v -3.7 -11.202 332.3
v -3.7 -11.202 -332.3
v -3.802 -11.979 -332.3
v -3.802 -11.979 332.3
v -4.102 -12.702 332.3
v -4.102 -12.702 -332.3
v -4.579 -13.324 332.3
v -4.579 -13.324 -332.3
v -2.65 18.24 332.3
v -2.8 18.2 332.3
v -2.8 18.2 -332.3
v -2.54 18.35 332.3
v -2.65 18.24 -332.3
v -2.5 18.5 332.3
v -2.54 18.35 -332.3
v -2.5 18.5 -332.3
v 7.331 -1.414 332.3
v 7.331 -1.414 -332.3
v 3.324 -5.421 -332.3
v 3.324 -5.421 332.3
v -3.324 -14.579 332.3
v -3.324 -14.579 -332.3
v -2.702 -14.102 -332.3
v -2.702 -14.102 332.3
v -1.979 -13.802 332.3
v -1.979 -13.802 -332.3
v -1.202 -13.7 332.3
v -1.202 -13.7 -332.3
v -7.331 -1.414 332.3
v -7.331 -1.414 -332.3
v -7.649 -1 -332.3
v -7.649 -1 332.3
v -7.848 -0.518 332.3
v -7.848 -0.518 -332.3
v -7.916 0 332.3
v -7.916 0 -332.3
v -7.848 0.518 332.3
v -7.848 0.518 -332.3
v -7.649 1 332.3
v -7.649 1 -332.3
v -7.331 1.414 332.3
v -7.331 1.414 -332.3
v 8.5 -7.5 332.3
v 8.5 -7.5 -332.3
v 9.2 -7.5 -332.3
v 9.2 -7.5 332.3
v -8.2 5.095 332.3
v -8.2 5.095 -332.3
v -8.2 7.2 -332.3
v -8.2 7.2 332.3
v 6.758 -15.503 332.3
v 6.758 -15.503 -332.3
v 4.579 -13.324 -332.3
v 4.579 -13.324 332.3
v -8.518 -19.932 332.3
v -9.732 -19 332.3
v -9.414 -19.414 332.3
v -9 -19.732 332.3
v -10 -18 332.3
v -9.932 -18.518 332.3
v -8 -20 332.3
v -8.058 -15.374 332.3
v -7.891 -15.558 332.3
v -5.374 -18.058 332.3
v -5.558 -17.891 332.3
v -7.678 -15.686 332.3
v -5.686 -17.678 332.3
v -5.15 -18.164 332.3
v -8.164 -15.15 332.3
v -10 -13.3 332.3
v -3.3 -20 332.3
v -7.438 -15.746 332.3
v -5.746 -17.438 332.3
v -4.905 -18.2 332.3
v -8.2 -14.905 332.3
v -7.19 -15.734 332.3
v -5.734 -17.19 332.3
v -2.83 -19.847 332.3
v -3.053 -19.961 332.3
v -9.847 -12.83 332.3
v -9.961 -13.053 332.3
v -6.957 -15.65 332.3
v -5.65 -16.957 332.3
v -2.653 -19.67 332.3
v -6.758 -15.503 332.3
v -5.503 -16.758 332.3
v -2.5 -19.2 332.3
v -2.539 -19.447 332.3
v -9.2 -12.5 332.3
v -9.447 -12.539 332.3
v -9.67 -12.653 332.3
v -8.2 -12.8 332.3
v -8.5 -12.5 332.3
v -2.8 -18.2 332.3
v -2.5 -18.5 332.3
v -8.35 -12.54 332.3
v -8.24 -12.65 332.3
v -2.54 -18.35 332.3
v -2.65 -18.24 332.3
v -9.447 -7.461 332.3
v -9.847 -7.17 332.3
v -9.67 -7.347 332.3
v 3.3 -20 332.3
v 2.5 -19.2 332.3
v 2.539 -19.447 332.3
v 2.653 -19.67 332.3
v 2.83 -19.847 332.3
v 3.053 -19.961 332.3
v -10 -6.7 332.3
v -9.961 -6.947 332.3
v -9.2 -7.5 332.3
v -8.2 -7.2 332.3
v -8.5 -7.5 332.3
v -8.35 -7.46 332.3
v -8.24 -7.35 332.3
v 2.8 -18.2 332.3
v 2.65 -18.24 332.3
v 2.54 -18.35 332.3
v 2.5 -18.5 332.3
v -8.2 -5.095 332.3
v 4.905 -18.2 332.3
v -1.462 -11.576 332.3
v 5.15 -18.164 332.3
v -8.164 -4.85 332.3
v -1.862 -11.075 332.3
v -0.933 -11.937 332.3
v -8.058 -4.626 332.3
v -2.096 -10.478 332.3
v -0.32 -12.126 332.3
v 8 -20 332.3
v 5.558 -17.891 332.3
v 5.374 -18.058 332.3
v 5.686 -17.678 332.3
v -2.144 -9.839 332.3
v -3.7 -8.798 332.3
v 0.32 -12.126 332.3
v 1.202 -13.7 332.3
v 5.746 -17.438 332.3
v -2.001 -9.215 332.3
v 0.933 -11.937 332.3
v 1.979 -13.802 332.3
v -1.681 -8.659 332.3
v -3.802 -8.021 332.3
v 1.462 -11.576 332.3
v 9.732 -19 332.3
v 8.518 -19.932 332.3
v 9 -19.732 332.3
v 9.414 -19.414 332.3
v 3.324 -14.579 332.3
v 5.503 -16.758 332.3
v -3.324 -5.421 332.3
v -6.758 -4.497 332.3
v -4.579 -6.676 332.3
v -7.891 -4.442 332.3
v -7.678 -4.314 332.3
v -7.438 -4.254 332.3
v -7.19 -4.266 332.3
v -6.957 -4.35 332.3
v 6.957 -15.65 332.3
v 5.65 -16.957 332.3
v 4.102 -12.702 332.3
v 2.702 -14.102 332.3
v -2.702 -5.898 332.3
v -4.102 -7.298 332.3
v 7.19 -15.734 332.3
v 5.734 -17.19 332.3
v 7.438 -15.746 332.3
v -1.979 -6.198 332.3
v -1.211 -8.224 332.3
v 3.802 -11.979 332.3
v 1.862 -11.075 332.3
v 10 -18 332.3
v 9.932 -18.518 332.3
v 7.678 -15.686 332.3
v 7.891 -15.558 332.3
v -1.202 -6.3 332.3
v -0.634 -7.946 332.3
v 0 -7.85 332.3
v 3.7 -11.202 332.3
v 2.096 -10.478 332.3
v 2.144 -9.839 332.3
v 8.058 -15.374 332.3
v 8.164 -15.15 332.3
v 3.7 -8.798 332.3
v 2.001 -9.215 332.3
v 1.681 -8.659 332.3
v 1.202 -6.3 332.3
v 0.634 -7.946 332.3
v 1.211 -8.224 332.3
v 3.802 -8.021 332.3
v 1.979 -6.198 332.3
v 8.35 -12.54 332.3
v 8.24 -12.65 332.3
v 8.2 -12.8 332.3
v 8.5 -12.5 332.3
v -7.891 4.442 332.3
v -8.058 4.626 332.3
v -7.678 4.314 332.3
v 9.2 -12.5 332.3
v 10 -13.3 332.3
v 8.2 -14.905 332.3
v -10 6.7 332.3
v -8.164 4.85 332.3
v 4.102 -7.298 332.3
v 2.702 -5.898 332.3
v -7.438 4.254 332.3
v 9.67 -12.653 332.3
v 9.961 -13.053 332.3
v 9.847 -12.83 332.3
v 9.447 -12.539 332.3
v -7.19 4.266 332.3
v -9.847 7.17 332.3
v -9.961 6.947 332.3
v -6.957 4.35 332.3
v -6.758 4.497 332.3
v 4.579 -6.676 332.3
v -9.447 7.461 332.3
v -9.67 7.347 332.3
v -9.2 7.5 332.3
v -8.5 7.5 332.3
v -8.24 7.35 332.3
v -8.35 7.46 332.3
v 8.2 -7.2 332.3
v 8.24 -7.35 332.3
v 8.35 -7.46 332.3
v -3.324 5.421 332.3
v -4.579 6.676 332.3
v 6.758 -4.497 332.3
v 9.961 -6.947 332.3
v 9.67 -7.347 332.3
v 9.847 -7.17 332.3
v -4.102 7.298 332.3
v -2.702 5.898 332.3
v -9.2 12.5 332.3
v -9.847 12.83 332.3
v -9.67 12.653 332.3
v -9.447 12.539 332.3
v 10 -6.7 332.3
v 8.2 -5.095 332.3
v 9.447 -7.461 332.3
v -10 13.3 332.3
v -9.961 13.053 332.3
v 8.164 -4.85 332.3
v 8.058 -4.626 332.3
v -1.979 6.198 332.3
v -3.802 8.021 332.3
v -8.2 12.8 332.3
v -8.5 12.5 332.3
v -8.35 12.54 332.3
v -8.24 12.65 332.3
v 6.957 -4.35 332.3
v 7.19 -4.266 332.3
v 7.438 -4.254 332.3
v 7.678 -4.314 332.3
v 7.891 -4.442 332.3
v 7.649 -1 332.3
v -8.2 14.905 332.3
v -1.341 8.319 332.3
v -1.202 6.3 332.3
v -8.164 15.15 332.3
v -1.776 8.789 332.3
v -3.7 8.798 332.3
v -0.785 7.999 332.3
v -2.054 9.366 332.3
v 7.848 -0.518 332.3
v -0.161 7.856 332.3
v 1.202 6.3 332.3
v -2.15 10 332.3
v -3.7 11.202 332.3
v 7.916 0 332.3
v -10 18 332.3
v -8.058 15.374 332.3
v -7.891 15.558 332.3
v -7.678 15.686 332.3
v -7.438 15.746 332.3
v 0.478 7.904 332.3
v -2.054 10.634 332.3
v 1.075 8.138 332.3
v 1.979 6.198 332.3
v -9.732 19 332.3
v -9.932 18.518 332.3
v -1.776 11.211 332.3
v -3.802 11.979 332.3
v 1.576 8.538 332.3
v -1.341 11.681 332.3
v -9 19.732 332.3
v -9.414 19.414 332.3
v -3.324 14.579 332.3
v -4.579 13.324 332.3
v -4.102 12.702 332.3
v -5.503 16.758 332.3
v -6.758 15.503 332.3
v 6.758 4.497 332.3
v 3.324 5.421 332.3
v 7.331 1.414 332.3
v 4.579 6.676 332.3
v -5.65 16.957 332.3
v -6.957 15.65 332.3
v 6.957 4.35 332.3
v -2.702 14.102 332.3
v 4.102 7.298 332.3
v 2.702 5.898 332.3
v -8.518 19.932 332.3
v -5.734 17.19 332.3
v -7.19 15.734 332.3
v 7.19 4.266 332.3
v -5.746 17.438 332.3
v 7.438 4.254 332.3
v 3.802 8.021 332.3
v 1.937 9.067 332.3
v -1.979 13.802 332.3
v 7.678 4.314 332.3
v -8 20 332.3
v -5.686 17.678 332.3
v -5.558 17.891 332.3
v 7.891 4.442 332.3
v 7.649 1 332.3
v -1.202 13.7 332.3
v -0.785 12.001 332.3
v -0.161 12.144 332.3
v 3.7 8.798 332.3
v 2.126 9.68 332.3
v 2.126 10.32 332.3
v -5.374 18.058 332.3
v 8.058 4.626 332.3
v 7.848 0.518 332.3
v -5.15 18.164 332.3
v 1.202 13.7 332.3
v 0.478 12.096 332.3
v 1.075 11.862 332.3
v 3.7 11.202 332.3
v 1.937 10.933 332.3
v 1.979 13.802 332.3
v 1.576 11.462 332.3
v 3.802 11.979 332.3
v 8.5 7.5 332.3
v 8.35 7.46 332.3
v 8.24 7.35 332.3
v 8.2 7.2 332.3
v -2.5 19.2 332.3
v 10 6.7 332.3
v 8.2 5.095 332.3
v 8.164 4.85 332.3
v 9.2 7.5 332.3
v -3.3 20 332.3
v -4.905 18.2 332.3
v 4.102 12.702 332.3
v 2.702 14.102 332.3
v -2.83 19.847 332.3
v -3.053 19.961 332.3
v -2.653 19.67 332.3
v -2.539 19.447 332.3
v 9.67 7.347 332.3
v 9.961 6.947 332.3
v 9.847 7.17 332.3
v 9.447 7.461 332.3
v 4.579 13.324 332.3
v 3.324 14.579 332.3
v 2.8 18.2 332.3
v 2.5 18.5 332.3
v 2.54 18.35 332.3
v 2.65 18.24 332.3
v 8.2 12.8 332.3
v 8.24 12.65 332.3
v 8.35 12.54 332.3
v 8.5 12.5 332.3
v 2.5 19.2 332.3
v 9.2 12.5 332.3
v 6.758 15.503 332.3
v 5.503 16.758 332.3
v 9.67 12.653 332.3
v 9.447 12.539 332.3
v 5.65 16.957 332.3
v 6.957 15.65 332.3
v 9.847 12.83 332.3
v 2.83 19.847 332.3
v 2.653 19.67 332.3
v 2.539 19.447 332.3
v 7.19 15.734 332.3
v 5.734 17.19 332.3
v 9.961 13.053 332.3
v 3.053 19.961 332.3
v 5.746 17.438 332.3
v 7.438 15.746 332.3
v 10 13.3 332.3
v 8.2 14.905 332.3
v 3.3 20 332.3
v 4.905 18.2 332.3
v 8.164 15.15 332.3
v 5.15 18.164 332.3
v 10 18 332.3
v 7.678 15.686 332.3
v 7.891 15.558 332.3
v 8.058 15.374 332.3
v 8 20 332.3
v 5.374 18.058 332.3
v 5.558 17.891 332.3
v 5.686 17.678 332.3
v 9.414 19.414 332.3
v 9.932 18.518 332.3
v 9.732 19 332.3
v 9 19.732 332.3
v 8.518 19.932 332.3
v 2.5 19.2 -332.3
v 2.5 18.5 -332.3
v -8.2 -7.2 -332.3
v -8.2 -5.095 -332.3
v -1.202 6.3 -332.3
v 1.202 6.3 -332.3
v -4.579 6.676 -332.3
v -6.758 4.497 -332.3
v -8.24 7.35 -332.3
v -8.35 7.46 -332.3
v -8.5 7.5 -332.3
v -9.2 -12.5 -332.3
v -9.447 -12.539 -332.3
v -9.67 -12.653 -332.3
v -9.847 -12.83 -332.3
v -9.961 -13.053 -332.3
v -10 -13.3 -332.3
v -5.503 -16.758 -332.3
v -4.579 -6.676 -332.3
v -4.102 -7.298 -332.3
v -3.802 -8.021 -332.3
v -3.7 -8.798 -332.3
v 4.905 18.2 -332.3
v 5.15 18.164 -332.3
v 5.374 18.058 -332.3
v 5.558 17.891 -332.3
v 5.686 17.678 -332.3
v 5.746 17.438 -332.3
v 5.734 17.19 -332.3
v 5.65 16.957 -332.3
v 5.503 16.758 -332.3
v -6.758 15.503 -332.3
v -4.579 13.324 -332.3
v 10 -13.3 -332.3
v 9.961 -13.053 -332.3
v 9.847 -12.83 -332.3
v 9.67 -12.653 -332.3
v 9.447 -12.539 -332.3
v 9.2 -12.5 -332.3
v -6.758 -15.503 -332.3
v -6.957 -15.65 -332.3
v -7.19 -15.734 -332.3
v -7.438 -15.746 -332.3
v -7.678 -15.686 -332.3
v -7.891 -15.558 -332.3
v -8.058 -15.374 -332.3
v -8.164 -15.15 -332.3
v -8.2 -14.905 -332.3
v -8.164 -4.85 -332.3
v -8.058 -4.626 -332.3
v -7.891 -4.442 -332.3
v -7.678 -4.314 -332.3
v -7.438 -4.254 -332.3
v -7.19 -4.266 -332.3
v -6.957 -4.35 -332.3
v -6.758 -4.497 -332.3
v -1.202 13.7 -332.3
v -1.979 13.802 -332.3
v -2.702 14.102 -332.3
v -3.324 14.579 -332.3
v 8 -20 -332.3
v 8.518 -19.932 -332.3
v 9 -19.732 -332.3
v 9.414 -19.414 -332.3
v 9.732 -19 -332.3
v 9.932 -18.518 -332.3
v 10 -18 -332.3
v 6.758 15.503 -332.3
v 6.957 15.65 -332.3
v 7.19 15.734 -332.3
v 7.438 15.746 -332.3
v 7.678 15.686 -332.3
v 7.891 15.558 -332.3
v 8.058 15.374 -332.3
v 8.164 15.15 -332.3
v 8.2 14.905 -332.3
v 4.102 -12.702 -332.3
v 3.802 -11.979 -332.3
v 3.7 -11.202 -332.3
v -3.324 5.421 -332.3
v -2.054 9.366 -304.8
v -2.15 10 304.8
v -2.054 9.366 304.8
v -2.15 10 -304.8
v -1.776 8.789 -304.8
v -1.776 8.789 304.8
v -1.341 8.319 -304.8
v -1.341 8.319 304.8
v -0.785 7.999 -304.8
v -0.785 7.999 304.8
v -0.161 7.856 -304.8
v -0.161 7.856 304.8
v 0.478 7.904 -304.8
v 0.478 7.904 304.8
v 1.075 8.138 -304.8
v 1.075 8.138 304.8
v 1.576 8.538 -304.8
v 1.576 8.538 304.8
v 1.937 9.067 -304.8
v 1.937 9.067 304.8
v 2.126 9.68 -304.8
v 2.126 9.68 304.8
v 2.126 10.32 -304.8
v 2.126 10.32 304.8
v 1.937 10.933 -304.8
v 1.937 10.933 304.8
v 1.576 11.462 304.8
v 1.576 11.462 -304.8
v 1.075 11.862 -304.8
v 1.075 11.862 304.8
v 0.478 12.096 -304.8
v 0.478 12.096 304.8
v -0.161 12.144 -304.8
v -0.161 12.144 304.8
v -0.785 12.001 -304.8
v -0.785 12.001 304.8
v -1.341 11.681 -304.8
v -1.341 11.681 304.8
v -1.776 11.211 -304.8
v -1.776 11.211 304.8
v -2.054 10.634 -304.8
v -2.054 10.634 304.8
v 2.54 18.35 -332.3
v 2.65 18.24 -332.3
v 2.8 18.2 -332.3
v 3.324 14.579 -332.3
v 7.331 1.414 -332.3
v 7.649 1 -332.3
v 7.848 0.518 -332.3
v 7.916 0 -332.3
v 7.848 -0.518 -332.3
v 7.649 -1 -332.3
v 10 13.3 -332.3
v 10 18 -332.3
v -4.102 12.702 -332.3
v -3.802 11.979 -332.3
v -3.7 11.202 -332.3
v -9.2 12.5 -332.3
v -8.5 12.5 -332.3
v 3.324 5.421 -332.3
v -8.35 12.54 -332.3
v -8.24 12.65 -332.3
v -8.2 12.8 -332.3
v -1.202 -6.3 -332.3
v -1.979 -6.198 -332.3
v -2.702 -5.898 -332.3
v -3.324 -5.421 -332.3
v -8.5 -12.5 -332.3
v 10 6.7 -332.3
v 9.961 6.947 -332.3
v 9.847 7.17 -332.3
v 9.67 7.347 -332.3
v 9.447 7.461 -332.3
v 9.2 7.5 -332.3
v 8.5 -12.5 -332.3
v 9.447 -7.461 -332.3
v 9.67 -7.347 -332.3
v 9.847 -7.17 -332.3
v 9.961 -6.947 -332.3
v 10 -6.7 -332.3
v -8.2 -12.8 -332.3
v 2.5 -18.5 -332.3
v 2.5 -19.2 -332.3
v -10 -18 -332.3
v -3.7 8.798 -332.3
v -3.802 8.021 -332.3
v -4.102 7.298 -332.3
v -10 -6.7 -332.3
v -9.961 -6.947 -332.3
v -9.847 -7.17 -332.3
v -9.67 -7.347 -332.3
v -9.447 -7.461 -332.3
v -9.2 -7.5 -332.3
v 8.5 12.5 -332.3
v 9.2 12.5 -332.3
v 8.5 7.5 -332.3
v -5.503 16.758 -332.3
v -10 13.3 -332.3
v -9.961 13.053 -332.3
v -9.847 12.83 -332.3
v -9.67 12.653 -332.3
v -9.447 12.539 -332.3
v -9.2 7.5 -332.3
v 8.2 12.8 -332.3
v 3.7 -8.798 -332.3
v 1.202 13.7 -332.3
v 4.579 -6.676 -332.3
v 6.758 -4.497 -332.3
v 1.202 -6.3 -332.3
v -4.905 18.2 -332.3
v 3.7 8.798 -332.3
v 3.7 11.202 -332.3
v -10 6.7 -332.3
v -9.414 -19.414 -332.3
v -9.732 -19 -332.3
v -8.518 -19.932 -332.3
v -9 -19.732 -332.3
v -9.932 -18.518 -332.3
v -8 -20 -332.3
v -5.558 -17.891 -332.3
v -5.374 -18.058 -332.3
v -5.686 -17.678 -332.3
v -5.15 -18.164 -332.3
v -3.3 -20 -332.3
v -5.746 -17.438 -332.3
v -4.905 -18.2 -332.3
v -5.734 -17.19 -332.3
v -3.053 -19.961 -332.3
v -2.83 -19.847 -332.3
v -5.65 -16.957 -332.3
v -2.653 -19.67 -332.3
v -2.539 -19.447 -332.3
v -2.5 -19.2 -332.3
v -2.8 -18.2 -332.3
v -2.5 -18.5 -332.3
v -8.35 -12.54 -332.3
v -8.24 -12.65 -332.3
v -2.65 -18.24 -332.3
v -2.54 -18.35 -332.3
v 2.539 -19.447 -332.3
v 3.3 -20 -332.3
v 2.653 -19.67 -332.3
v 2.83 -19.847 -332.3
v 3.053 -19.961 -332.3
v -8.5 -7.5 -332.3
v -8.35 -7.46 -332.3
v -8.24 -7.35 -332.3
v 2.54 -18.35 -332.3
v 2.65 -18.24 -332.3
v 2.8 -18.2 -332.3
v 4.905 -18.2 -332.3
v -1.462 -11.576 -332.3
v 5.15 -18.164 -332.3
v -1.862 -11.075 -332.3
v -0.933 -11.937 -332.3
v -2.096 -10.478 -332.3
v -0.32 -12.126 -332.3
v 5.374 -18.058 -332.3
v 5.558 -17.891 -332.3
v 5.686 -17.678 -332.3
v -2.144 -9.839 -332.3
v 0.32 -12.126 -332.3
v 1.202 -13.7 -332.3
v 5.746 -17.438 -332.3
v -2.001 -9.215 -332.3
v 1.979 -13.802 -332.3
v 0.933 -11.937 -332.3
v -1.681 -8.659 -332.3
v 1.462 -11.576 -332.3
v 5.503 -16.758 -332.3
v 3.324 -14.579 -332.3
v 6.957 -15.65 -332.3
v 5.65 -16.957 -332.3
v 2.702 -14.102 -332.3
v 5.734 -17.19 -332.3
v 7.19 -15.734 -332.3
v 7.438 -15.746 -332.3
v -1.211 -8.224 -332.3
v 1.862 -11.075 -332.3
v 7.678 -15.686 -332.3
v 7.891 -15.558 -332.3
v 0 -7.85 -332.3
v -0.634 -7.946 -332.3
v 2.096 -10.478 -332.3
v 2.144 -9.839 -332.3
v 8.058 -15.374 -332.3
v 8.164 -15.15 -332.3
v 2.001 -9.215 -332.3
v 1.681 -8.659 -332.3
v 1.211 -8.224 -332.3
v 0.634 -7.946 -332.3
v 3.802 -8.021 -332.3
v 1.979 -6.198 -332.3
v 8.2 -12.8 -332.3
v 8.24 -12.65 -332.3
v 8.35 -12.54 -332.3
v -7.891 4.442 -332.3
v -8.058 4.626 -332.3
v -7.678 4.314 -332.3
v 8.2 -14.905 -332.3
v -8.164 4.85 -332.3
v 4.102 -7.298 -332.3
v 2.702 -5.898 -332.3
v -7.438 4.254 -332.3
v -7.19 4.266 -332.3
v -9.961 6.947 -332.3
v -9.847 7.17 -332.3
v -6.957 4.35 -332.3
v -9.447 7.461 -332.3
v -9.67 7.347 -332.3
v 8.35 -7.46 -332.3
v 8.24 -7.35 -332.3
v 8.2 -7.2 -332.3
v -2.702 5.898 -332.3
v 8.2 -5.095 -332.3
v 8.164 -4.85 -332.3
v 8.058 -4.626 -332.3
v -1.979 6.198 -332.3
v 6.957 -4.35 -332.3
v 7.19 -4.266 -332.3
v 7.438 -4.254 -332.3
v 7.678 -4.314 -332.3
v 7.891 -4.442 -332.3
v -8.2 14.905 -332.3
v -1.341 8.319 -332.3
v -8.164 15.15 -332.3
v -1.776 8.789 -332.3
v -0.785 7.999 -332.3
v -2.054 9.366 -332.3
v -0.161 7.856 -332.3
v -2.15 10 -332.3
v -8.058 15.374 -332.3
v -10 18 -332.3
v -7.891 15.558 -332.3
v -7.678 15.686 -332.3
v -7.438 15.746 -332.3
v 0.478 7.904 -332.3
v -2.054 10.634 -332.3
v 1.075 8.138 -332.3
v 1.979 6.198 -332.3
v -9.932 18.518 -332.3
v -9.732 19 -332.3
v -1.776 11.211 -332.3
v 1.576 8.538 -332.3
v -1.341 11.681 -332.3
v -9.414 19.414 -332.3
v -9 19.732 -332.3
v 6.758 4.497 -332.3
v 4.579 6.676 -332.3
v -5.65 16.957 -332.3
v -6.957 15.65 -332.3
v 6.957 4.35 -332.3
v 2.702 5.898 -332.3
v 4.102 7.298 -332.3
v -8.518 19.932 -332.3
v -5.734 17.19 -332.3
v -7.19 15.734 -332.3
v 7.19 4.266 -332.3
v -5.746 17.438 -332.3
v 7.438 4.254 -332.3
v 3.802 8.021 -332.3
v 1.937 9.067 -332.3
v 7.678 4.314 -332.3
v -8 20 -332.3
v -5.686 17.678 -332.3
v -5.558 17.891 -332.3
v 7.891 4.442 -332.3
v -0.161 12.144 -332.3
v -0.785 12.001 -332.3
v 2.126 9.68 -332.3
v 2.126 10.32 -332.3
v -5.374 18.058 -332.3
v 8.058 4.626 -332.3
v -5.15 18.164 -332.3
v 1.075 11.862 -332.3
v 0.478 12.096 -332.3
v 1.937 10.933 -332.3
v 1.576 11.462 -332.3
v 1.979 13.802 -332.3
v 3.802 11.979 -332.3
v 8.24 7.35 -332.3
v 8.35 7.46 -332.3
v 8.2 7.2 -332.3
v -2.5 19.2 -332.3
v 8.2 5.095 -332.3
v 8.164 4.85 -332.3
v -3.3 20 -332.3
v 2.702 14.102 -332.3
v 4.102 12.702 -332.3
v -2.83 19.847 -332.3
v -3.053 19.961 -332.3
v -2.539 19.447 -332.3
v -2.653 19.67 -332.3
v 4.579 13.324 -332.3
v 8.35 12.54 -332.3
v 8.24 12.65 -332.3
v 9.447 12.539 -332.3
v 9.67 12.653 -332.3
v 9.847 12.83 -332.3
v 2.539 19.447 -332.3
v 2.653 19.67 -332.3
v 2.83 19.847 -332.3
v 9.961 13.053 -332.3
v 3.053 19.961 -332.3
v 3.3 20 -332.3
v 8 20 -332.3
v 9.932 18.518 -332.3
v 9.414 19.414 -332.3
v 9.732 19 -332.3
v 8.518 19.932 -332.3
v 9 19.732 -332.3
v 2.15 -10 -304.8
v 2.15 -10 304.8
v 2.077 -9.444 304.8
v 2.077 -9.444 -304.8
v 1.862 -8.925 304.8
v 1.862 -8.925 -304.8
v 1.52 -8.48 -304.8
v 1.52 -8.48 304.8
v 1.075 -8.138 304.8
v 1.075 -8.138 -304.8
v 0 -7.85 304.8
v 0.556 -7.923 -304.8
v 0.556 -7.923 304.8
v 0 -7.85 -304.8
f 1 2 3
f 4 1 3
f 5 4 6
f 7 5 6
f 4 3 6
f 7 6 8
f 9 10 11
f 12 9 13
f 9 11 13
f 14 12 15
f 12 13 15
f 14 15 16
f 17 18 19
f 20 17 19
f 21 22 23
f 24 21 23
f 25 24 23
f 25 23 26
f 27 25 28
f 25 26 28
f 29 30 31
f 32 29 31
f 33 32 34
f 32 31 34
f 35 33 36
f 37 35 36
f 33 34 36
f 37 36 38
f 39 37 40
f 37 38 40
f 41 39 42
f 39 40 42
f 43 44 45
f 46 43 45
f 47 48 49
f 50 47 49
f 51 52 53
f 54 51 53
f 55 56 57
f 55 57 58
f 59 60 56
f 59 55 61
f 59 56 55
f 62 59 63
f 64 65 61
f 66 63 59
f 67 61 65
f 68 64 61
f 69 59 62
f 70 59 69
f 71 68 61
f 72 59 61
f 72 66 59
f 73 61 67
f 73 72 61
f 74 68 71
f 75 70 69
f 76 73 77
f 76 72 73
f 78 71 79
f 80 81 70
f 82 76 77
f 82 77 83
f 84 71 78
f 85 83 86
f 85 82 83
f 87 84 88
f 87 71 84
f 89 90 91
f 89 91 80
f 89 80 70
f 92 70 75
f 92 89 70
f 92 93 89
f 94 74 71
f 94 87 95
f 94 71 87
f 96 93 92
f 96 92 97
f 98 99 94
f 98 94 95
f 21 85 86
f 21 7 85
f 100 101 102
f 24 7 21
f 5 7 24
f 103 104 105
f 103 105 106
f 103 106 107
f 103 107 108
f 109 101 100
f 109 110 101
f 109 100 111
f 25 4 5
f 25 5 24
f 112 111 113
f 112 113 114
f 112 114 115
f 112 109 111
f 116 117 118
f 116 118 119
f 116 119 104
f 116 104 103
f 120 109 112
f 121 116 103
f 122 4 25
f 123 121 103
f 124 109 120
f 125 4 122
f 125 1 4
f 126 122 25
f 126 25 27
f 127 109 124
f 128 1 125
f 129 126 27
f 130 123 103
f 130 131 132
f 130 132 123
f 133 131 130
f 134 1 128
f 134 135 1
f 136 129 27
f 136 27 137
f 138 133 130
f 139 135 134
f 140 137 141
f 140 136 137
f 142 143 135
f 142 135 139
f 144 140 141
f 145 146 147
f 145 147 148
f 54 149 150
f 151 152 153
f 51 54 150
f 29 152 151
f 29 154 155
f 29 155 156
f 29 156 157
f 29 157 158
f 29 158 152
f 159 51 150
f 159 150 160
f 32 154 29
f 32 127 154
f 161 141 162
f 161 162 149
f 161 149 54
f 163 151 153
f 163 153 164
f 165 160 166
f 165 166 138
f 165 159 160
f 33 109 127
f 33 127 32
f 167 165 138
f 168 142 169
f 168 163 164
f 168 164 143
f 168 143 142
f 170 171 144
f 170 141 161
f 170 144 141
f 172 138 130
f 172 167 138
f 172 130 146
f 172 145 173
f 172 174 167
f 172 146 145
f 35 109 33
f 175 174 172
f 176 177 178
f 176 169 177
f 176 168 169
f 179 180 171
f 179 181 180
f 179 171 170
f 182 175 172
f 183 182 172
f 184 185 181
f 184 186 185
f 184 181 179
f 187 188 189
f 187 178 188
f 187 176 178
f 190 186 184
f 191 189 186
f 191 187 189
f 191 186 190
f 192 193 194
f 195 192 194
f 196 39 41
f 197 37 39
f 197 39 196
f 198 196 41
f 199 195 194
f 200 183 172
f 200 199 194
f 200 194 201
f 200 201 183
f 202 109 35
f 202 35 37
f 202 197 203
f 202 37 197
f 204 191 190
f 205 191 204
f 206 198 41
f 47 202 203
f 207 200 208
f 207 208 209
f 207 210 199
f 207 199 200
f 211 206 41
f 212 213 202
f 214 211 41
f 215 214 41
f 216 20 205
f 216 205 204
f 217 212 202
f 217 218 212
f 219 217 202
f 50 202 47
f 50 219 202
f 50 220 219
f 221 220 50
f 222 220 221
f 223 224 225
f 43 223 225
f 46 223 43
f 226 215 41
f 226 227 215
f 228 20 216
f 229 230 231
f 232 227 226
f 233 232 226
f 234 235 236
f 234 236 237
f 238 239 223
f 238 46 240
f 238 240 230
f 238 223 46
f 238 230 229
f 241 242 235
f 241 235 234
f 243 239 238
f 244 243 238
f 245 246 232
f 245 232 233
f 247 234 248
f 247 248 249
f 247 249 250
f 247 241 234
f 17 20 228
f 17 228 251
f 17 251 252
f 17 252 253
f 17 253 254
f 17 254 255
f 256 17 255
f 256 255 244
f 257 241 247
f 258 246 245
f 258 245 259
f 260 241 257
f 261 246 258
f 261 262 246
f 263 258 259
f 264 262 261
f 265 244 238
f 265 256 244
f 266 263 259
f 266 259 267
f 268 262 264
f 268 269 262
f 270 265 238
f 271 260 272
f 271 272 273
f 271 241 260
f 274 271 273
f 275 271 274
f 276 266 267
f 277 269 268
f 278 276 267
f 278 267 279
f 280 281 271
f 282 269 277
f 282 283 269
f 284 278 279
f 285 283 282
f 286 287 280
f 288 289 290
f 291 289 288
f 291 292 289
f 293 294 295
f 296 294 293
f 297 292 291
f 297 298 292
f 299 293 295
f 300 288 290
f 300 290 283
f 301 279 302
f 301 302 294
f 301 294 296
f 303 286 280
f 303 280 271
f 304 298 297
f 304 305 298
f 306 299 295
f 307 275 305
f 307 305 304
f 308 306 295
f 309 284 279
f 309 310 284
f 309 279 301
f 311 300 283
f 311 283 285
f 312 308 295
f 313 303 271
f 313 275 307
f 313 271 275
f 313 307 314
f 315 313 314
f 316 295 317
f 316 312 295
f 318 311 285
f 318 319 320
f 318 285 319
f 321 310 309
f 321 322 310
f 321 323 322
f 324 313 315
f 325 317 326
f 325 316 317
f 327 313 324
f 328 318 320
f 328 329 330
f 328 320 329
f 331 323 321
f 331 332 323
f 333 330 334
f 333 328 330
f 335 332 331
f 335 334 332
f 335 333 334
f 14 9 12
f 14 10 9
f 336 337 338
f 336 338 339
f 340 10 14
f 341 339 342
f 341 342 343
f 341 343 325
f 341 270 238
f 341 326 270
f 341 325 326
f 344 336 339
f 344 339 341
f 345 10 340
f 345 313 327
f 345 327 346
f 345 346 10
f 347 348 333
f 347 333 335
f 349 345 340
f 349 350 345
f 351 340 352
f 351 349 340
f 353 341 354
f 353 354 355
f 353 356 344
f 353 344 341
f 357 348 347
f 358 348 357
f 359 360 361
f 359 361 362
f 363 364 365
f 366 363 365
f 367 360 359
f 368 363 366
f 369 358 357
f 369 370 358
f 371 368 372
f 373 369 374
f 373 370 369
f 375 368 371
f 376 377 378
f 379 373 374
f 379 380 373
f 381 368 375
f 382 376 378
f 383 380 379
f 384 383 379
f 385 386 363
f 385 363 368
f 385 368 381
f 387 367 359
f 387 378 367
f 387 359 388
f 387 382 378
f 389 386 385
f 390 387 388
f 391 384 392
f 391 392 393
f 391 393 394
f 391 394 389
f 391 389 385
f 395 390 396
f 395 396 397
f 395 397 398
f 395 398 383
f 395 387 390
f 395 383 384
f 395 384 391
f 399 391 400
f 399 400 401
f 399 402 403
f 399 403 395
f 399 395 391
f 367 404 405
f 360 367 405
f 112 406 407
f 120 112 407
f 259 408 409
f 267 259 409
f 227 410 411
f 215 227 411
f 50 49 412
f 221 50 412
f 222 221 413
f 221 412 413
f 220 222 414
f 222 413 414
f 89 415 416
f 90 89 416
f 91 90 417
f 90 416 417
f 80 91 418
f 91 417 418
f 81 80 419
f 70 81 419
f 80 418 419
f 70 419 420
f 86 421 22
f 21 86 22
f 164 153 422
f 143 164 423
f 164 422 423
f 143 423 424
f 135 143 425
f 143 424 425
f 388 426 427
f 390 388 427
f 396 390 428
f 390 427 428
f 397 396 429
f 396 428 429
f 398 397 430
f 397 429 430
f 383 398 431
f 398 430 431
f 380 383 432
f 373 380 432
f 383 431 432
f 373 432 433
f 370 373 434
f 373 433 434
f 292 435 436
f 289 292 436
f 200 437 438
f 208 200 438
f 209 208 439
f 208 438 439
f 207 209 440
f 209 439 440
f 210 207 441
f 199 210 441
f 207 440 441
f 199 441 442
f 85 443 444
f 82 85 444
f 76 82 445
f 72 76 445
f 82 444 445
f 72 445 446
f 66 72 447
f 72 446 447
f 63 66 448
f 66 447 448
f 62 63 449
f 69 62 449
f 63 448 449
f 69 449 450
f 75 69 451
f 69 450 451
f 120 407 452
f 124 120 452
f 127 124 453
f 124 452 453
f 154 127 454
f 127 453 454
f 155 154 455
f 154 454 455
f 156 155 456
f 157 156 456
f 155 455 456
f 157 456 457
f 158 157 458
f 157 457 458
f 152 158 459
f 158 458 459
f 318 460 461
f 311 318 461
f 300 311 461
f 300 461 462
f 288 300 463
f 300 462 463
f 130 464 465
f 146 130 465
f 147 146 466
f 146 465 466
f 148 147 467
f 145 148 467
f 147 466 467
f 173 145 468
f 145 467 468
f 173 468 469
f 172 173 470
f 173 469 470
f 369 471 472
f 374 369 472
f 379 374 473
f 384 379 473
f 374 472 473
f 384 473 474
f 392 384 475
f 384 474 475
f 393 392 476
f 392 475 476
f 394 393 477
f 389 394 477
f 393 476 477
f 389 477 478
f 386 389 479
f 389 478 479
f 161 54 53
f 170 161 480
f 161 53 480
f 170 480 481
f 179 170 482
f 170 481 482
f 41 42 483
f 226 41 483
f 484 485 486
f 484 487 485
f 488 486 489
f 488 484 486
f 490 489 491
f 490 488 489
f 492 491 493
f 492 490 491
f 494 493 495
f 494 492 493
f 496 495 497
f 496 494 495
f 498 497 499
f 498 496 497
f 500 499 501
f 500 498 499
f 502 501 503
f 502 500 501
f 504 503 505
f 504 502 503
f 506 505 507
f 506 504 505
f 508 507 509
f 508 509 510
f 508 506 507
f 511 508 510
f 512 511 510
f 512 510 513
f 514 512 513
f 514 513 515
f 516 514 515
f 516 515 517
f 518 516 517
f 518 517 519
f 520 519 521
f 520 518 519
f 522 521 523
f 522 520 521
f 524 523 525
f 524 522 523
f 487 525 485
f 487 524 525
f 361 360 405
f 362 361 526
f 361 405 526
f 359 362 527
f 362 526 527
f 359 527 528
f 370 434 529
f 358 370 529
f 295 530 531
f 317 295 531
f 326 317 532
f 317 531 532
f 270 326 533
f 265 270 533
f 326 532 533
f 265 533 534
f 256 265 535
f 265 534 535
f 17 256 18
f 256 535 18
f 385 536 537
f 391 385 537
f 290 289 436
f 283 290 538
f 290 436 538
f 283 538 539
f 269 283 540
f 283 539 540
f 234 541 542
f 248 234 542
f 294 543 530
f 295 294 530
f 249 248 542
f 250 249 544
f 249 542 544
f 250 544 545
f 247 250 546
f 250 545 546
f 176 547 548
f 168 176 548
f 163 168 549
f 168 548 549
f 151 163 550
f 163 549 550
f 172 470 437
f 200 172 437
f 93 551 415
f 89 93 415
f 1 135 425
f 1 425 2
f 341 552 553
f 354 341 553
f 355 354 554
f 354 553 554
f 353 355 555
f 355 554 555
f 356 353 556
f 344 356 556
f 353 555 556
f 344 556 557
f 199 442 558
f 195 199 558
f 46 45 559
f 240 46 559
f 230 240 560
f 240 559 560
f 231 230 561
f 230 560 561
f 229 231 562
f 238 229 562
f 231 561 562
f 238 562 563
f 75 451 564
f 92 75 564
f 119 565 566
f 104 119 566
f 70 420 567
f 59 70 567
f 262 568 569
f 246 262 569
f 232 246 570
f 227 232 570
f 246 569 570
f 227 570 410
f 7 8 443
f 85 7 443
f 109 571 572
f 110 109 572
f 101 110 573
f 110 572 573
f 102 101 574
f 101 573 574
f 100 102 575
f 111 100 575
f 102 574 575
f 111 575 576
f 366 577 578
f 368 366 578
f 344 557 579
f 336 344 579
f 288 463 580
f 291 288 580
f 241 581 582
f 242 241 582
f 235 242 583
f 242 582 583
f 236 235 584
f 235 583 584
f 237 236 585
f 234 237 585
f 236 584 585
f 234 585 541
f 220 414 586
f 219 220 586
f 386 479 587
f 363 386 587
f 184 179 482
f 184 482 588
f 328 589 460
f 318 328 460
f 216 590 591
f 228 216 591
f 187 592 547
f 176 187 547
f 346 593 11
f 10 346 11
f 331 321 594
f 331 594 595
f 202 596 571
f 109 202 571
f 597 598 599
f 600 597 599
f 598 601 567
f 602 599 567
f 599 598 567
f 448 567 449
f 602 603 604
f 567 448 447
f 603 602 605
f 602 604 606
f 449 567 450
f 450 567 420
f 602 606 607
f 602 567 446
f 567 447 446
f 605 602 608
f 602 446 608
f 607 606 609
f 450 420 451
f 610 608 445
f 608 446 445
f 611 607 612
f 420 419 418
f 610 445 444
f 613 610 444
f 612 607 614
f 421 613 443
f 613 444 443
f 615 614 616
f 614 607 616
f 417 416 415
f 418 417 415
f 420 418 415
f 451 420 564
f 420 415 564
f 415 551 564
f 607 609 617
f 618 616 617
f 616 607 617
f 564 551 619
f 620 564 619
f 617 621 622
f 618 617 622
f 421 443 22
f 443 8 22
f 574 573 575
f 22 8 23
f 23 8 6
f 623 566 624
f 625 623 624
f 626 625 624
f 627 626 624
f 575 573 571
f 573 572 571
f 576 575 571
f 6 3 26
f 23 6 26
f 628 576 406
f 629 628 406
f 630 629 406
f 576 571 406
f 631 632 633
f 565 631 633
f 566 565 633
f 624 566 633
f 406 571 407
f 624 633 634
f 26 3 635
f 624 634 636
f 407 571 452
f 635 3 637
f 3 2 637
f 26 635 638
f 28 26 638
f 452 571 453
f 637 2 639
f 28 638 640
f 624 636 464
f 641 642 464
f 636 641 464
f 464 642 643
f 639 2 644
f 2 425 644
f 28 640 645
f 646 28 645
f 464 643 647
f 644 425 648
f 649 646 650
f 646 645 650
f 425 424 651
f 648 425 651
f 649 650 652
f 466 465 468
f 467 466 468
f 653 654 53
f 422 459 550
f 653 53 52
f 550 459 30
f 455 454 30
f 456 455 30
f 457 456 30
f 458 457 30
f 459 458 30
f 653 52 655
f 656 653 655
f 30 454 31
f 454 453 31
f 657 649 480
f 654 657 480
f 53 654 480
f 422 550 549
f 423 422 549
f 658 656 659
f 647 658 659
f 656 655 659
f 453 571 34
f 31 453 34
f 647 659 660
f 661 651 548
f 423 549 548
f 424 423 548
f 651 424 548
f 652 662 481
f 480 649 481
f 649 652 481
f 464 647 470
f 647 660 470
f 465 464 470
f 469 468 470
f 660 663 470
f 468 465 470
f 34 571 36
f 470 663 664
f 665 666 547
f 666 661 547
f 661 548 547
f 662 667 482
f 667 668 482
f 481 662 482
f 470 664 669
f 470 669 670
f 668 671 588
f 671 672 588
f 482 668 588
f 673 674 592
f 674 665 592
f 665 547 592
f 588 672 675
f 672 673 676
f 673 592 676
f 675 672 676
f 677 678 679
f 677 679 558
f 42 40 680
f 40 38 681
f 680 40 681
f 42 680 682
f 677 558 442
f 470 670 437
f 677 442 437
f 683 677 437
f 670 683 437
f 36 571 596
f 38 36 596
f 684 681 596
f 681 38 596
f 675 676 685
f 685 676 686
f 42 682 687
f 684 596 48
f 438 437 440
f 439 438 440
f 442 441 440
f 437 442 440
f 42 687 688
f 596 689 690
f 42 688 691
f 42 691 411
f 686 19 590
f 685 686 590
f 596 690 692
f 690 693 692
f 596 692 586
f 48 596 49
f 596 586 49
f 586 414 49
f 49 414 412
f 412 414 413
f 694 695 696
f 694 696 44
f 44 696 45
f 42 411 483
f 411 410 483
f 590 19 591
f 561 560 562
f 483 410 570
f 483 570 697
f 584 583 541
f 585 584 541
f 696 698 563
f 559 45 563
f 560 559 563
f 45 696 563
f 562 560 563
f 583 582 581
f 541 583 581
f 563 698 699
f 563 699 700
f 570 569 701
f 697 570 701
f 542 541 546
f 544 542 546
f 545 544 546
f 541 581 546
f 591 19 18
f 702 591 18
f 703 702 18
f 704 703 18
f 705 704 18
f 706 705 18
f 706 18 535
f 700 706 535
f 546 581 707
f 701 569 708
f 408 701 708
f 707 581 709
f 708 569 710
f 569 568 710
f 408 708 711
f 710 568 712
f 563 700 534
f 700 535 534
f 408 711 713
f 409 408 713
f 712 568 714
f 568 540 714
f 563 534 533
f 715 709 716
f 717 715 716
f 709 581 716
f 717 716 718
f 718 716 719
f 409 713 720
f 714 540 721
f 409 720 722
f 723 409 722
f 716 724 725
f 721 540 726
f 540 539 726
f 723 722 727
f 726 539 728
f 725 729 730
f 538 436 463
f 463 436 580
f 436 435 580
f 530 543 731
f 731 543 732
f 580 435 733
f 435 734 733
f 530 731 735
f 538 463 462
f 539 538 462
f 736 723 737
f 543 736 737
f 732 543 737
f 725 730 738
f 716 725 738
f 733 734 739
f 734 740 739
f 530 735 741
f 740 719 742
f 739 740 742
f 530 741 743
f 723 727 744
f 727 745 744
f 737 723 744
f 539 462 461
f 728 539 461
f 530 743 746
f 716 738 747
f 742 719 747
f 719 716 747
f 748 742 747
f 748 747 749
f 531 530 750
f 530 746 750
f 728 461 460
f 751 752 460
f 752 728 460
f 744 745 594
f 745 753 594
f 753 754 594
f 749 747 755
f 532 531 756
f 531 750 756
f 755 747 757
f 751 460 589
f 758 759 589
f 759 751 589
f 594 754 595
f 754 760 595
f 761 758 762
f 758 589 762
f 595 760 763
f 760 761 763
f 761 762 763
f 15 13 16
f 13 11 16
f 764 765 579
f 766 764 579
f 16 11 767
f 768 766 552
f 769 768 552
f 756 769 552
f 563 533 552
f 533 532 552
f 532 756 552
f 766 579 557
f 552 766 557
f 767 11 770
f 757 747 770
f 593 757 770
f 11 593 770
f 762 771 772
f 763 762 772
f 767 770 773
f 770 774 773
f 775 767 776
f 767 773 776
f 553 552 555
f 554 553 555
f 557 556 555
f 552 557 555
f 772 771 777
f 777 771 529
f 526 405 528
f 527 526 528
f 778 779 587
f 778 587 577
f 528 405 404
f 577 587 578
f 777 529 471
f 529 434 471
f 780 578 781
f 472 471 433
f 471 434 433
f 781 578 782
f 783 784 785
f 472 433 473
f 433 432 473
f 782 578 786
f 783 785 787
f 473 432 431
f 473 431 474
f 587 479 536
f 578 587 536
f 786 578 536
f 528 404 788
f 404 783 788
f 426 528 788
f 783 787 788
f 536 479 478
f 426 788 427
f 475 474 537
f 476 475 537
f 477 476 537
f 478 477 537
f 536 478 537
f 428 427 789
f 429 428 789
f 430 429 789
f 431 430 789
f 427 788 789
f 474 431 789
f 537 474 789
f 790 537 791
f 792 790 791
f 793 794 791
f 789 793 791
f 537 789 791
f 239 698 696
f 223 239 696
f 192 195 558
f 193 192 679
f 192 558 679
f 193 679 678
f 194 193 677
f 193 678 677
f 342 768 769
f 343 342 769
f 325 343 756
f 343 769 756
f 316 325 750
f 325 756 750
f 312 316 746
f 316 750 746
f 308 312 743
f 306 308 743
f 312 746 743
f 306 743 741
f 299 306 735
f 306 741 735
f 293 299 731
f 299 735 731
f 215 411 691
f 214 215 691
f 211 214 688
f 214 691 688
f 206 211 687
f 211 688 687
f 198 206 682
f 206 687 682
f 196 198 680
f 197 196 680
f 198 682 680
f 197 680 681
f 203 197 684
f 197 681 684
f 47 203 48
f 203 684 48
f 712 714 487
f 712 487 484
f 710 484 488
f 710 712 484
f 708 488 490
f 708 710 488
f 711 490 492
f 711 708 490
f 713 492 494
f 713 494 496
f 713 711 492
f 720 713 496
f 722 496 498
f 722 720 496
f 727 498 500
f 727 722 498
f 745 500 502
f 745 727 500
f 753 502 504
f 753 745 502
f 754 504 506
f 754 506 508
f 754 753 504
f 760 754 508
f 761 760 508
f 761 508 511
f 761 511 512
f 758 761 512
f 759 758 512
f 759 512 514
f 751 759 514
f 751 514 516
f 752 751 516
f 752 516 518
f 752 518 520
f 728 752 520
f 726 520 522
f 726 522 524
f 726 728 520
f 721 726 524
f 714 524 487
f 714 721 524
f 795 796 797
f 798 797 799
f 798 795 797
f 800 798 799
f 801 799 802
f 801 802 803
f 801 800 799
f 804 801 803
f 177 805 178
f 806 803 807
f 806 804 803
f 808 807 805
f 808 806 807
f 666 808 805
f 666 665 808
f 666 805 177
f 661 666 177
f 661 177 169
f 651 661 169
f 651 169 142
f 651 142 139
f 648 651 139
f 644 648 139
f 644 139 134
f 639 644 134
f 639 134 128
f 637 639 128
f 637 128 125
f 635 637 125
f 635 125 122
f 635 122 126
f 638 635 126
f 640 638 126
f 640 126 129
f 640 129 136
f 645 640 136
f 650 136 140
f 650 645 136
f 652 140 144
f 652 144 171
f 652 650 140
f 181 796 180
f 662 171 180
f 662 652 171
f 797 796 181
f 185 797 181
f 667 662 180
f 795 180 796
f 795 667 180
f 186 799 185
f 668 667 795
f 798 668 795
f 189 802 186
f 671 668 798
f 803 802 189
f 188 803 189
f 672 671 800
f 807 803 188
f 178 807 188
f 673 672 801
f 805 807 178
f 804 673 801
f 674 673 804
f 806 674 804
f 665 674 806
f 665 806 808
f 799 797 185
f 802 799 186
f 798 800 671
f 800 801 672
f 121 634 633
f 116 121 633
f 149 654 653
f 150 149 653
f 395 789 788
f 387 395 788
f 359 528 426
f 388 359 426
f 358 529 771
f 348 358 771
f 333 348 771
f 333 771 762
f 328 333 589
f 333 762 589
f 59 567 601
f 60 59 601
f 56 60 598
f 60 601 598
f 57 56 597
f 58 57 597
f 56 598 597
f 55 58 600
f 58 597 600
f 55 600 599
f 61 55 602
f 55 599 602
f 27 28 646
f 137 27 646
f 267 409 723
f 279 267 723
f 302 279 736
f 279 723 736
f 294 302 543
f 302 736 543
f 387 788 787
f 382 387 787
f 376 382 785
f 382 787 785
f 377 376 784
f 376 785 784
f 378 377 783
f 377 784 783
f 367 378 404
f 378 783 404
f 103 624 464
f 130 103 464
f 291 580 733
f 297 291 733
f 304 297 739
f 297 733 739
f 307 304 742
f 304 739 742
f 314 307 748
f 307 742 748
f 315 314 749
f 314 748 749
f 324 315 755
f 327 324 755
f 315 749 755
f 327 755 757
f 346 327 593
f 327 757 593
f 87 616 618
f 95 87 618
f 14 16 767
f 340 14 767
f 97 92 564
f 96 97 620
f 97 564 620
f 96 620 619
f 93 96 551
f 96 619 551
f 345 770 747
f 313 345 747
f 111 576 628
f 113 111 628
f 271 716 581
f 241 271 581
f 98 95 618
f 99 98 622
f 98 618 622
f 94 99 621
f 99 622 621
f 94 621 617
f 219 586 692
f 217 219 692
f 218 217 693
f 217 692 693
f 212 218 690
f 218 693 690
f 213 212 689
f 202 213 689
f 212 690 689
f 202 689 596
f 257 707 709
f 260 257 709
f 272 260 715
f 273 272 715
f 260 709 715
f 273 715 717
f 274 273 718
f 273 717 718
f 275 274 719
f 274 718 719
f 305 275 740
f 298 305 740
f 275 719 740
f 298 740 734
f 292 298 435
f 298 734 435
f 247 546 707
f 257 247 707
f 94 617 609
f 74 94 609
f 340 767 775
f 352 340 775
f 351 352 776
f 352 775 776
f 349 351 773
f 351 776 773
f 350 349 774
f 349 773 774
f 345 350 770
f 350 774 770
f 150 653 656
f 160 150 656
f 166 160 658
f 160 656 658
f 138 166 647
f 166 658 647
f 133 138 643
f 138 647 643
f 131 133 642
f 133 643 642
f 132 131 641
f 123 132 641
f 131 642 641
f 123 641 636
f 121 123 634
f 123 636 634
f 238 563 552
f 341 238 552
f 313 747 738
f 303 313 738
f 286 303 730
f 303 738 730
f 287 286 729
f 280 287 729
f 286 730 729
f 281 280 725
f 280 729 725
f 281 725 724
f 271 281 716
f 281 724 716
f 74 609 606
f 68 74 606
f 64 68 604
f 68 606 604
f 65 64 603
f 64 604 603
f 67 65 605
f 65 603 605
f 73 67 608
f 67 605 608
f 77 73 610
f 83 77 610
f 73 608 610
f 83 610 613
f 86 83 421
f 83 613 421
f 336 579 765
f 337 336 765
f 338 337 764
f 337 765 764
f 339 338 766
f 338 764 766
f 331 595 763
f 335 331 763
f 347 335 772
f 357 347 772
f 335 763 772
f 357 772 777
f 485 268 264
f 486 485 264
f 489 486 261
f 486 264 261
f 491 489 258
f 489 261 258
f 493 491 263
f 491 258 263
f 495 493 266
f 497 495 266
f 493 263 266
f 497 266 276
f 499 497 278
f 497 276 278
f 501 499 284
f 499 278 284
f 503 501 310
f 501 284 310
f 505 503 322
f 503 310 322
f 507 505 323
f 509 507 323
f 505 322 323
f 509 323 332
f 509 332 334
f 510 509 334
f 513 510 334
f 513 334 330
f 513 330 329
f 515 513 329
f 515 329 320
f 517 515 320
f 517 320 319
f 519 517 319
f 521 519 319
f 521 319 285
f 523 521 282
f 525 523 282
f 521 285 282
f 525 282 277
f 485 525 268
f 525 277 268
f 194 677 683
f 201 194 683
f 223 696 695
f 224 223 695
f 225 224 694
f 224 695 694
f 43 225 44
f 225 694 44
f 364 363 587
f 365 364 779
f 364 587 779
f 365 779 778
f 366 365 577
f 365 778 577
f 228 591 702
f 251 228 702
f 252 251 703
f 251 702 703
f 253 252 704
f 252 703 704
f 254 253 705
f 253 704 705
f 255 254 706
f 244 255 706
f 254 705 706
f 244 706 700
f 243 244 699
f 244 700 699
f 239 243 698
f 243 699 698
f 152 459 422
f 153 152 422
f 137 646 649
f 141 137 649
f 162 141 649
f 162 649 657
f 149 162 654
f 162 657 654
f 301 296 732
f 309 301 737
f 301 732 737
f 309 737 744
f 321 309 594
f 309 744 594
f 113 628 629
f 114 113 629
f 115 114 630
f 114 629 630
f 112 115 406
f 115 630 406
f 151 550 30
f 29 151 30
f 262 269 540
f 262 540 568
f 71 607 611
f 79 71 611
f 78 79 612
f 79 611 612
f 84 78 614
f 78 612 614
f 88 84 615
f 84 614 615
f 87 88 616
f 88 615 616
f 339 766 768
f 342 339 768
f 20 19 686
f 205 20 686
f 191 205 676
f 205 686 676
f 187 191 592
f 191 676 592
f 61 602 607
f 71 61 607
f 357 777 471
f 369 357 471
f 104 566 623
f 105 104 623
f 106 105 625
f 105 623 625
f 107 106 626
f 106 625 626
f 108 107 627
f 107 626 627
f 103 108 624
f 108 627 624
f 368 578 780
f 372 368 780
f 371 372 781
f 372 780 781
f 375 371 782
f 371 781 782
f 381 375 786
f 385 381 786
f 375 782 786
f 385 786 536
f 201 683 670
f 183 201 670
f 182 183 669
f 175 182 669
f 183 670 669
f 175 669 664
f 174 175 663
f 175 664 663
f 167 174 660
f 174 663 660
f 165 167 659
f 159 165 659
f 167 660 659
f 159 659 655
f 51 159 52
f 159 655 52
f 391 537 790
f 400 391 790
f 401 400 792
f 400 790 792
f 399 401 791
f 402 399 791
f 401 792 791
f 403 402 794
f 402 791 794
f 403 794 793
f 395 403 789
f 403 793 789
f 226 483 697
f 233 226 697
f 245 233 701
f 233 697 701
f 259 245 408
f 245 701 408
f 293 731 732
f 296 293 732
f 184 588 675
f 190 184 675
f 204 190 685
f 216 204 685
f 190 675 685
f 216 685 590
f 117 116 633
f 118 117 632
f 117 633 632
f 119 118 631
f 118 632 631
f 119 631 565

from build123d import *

# Parameters (mm, degrees)
SKETCH3_R           = 2.15
BOSS_EXTRUDE1_DEPTH = 304.8
CIRPATTERN1_COUNT   = 2
BOSS_EXTRUDE2_START = 27.5
SKETCH4_R           = 2.15
BOSS_EXTRUDE2_DEPTH = 27.5


with BuildPart() as part:
    # Sketch3 → Boss-Extrude1 (new, symmetric)
    with BuildSketch(Plane.XY):
        with BuildLine():
            Line((-8.5, 7.5), (-9.2, 7.5))
            ThreePointArc((-9.2, 7.5), (-9.765685425, 7.265685425), (-10, 6.7))
            Line((-10, 6.7), (-10, 0))
            Line((-10, 0), (-7.916458339, 0))
            ThreePointArc((-7.916458339, 0), (-7.764217404, 0.765366865), (-7.330671901, 1.414213562))
            Line((-7.330671901, 1.414213562), (-3.32356512, 5.421320344))
            ThreePointArc((-3.32356512, 5.421320344), (-2.350295073, 6.071638598), (-1.202244776, 6.3))
            Line((-1.202244776, 6.3), (1.202244776, 6.3))
            ThreePointArc((1.202244776, 6.3), (2.350295073, 6.071638598), (3.32356512, 5.421320344))
            Line((3.32356512, 5.421320344), (7.330671901, 1.414213562))
            ThreePointArc((7.330671901, 1.414213562), (7.764217404, 0.765366865), (7.916458339, 0))
            Line((7.916458339, 0), (10, 0))
            Line((10, 0), (10, 6.7))
            ThreePointArc((10, 6.7), (9.765685425, 7.265685425), (9.2, 7.5))
            Line((9.2, 7.5), (8.5, 7.5))
            ThreePointArc((8.5, 7.5), (8.287867966, 7.412132034), (8.2, 7.2))
            Line((8.2, 7.2), (8.2, 5.094911614))
            ThreePointArc((8.2, 5.094911614), (7.678422063, 4.314315067), (6.757645654, 4.497468882))
            Line((6.757645654, 4.497468882), (4.578679656, 6.67643488))
            ThreePointArc((4.578679656, 6.67643488), (3.928361402, 7.649704927), (3.7, 8.797755224))
            Line((3.7, 8.797755224), (3.7, 11.202244776))
            ThreePointArc((3.7, 11.202244776), (3.928361402, 12.350295073), (4.578679656, 13.32356512))
            Line((4.578679656, 13.32356512), (6.757645654, 15.502531118))
            ThreePointArc((6.757645654, 15.502531118), (7.678422063, 15.685684933), (8.2, 14.905088386))
            Line((8.2, 14.905088386), (8.2, 12.8))
            ThreePointArc((8.2, 12.8), (8.287867966, 12.587867966), (8.5, 12.5))
            Line((8.5, 12.5), (9.2, 12.5))
            ThreePointArc((9.2, 12.5), (9.765685425, 12.734314575), (10, 13.3))
            Line((10, 13.3), (10, 18))
            ThreePointArc((10, 18), (9.414213562, 19.414213562), (8, 20))
            Line((8, 20), (3.3, 20))
            ThreePointArc((3.3, 20), (2.734314575, 19.765685425), (2.5, 19.2))
            Line((2.5, 19.2), (2.5, 18.5))
            ThreePointArc((2.5, 18.5), (2.587867966, 18.287867966), (2.8, 18.2))
            Line((2.8, 18.2), (4.905088386, 18.2))
            ThreePointArc((4.905088386, 18.2), (5.685684933, 17.678422063), (5.502531118, 16.757645654))
            Line((5.502531118, 16.757645654), (3.32356512, 14.578679656))
            ThreePointArc((3.32356512, 14.578679656), (2.350295073, 13.928361402), (1.202244776, 13.7))
            Line((1.202244776, 13.7), (-1.202244776, 13.7))
            ThreePointArc((-1.202244776, 13.7), (-2.350295073, 13.928361402), (-3.32356512, 14.578679656))
            Line((-3.32356512, 14.578679656), (-5.502531118, 16.757645654))
            ThreePointArc((-5.502531118, 16.757645654), (-5.685684933, 17.678422063), (-4.905088386, 18.2))
            Line((-4.905088386, 18.2), (-2.8, 18.2))
            ThreePointArc((-2.8, 18.2), (-2.587867966, 18.287867966), (-2.5, 18.5))
            Line((-2.5, 18.5), (-2.5, 19.2))
            ThreePointArc((-2.5, 19.2), (-2.734314575, 19.765685425), (-3.3, 20))
            Line((-3.3, 20), (-8, 20))
            ThreePointArc((-8, 20), (-9.414213562, 19.414213562), (-10, 18))
            Line((-10, 18), (-10, 13.3))
            ThreePointArc((-10, 13.3), (-9.765685425, 12.734314575), (-9.2, 12.5))
            Line((-9.2, 12.5), (-8.5, 12.5))
            ThreePointArc((-8.5, 12.5), (-8.287867966, 12.587867966), (-8.2, 12.8))
            Line((-8.2, 12.8), (-8.2, 14.905088386))
            ThreePointArc((-8.2, 14.905088386), (-7.678422063, 15.685684933), (-6.757645654, 15.502531118))
            Line((-6.757645654, 15.502531118), (-4.578679656, 13.32356512))
            ThreePointArc((-4.578679656, 13.32356512), (-3.928361402, 12.350295073), (-3.7, 11.202244776))
            Line((-3.7, 11.202244776), (-3.7, 8.797755224))
            ThreePointArc((-3.7, 8.797755224), (-3.928361402, 7.649704927), (-4.578679656, 6.67643488))
            Line((-4.578679656, 6.67643488), (-6.757645654, 4.497468882))
            ThreePointArc((-6.757645654, 4.497468882), (-7.678422063, 4.314315067), (-8.2, 5.094911614))
            Line((-8.2, 5.094911614), (-8.2, 7.2))
            ThreePointArc((-8.2, 7.2), (-8.287867966, 7.412132034), (-8.5, 7.5))
        make_face()
        with Locations(Location((0, 10, 0), (0, 0, 180))):
            Circle(SKETCH3_R, mode=Mode.SUBTRACT)
    boss_extrude1 = extrude(amount=BOSS_EXTRUDE1_DEPTH, both=True)

    # CirPattern1: Boss-Extrude1 ×2 about axis
    cirpattern1_axis = Axis((0, 0, 0), (0, 0, 1))
    for i in range(1, CIRPATTERN1_COUNT):
        add(boss_extrude1.rotate(cirpattern1_axis, i * 360 / CIRPATTERN1_COUNT))

    # Sketch4 → Boss-Extrude2 (add)
    with BuildSketch(Plane.XY.offset(304.8).offset(BOSS_EXTRUDE2_START)):
        with BuildLine():
            Line((-2.5, 18.5), (-2.5, 19.2))
            ThreePointArc((-2.5, 19.2), (-2.734314575, 19.765685425), (-3.3, 20))
            Line((-3.3, 20), (-8, 20))
            ThreePointArc((-8, 20), (-9.414213562, 19.414213562), (-10, 18))
            Line((-10, 18), (-10, 13.3))
            ThreePointArc((-10, 13.3), (-9.765685425, 12.734314575), (-9.2, 12.5))
            Line((-9.2, 12.5), (-8.5, 12.5))
            ThreePointArc((-8.5, 12.5), (-8.287867966, 12.587867966), (-8.2, 12.8))
            Line((-8.2, 12.8), (-8.2, 14.905088386))
            ThreePointArc((-8.2, 14.905088386), (-7.678422063, 15.685684933), (-6.757645654, 15.502531118))
            Line((-6.757645654, 15.502531118), (-4.578679656, 13.32356512))
            ThreePointArc((-4.578679656, 13.32356512), (-3.928361402, 12.350295073), (-3.7, 11.202244776))
            Line((-3.7, 11.202244776), (-3.7, 8.797755224))
            ThreePointArc((-3.7, 8.797755224), (-3.928361402, 7.649704927), (-4.578679656, 6.67643488))
            Line((-4.578679656, 6.67643488), (-6.757645654, 4.497468882))
            ThreePointArc((-6.757645654, 4.497468882), (-7.678422063, 4.314315067), (-8.2, 5.094911614))
            Line((-8.2, 5.094911614), (-8.2, 7.2))
            ThreePointArc((-8.2, 7.2), (-8.287867966, 7.412132034), (-8.5, 7.5))
            Line((-8.5, 7.5), (-9.2, 7.5))
            ThreePointArc((-9.2, 7.5), (-9.765685425, 7.265685425), (-10, 6.7))
            Line((-10, 6.7), (-10, -6.7))
            ThreePointArc((-10, -6.7), (-9.765685425, -7.265685425), (-9.2, -7.5))
            Line((-9.2, -7.5), (-8.5, -7.5))
            ThreePointArc((-8.5, -7.5), (-8.287867966, -7.412132034), (-8.2, -7.2))
            Line((-8.2, -7.2), (-8.2, -5.094911614))
            ThreePointArc((-8.2, -5.094911614), (-7.678422063, -4.314315067), (-6.757645654, -4.497468882))
            Line((-6.757645654, -4.497468882), (-4.578679656, -6.67643488))
            ThreePointArc((-4.578679656, -6.67643488), (-3.928361402, -7.649704927), (-3.7, -8.797755224))
            Line((-3.7, -8.797755224), (-3.7, -11.202244776))
            ThreePointArc((-3.7, -11.202244776), (-3.928361402, -12.350295073), (-4.578679656, -13.32356512))
            Line((-4.578679656, -13.32356512), (-6.757645654, -15.502531118))
            ThreePointArc((-6.757645654, -15.502531118), (-7.678422063, -15.685684933), (-8.2, -14.905088386))
            Line((-8.2, -14.905088386), (-8.2, -12.8))
            ThreePointArc((-8.2, -12.8), (-8.287867966, -12.587867966), (-8.5, -12.5))
            Line((-8.5, -12.5), (-9.2, -12.5))
            ThreePointArc((-9.2, -12.5), (-9.765685425, -12.734314575), (-10, -13.3))
            Line((-10, -13.3), (-10, -18))
            ThreePointArc((-10, -18), (-9.414213562, -19.414213562), (-8, -20))
            Line((-8, -20), (-3.3, -20))
            ThreePointArc((-3.3, -20), (-2.734314575, -19.765685425), (-2.5, -19.2))
            Line((-2.5, -19.2), (-2.5, -18.5))
            ThreePointArc((-2.5, -18.5), (-2.587867966, -18.287867966), (-2.8, -18.2))
            Line((-2.8, -18.2), (-4.905088386, -18.2))
            ThreePointArc((-4.905088386, -18.2), (-5.685684933, -17.678422063), (-5.502531118, -16.757645654))
            Line((-5.502531118, -16.757645654), (-3.32356512, -14.578679656))
            ThreePointArc((-3.32356512, -14.578679656), (-2.350295073, -13.928361402), (-1.202244776, -13.7))
            Line((-1.202244776, -13.7), (1.202244776, -13.7))
            ThreePointArc((1.202244776, -13.7), (2.350295073, -13.928361402), (3.32356512, -14.578679656))
            Line((3.32356512, -14.578679656), (5.502531118, -16.757645654))
            ThreePointArc((5.502531118, -16.757645654), (5.685684933, -17.678422063), (4.905088386, -18.2))
            Line((4.905088386, -18.2), (2.8, -18.2))
            ThreePointArc((2.8, -18.2), (2.587867966, -18.287867966), (2.5, -18.5))
            Line((2.5, -18.5), (2.5, -19.2))
            ThreePointArc((2.5, -19.2), (2.734314575, -19.765685425), (3.3, -20))
            Line((3.3, -20), (8, -20))
            ThreePointArc((8, -20), (9.414213562, -19.414213562), (10, -18))
            Line((10, -18), (10, -13.3))
            ThreePointArc((10, -13.3), (9.765685425, -12.734314575), (9.2, -12.5))
            Line((9.2, -12.5), (8.5, -12.5))
            ThreePointArc((8.5, -12.5), (8.287867966, -12.587867966), (8.2, -12.8))
            Line((8.2, -12.8), (8.2, -14.905088386))
            ThreePointArc((8.2, -14.905088386), (7.678422063, -15.685684933), (6.757645654, -15.502531118))
            Line((6.757645654, -15.502531118), (4.578679656, -13.32356512))
            ThreePointArc((4.578679656, -13.32356512), (3.928361402, -12.350295073), (3.7, -11.202244776))
            Line((3.7, -11.202244776), (3.7, -8.797755224))
            ThreePointArc((3.7, -8.797755224), (3.928361402, -7.649704927), (4.578679656, -6.67643488))
            Line((4.578679656, -6.67643488), (6.757645654, -4.497468882))
            ThreePointArc((6.757645654, -4.497468882), (7.678422063, -4.314315067), (8.2, -5.094911614))
            Line((8.2, -5.094911614), (8.2, -7.2))
            ThreePointArc((8.2, -7.2), (8.287867966, -7.412132034), (8.5, -7.5))
            Line((8.5, -7.5), (9.2, -7.5))
            ThreePointArc((9.2, -7.5), (9.765685425, -7.265685425), (10, -6.7))
            Line((10, -6.7), (10, 6.7))
            ThreePointArc((10, 6.7), (9.765685425, 7.265685425), (9.2, 7.5))
            Line((9.2, 7.5), (8.5, 7.5))
            ThreePointArc((8.5, 7.5), (8.287867966, 7.412132034), (8.2, 7.2))
            Line((8.2, 7.2), (8.2, 5.094911614))
            ThreePointArc((8.2, 5.094911614), (7.678422063, 4.314315067), (6.757645654, 4.497468882))
            Line((6.757645654, 4.497468882), (4.578679656, 6.67643488))
            ThreePointArc((4.578679656, 6.67643488), (3.928361402, 7.649704927), (3.7, 8.797755224))
            Line((3.7, 8.797755224), (3.7, 11.202244776))
            ThreePointArc((3.7, 11.202244776), (3.928361402, 12.350295073), (4.578679656, 13.32356512))
            Line((4.578679656, 13.32356512), (6.757645654, 15.502531118))
            ThreePointArc((6.757645654, 15.502531118), (7.678422063, 15.685684933), (8.2, 14.905088386))
            Line((8.2, 14.905088386), (8.2, 12.8))
            ThreePointArc((8.2, 12.8), (8.287867966, 12.587867966), (8.5, 12.5))
            Line((8.5, 12.5), (9.2, 12.5))
            ThreePointArc((9.2, 12.5), (9.765685425, 12.734314575), (10, 13.3))
            Line((10, 13.3), (10, 18))
            ThreePointArc((10, 18), (9.414213562, 19.414213562), (8, 20))
            Line((8, 20), (3.3, 20))
            ThreePointArc((3.3, 20), (2.734314575, 19.765685425), (2.5, 19.2))
            Line((2.5, 19.2), (2.5, 18.5))
            ThreePointArc((2.5, 18.5), (2.587867966, 18.287867966), (2.8, 18.2))
            Line((2.8, 18.2), (4.905088386, 18.2))
            ThreePointArc((4.905088386, 18.2), (5.685684933, 17.678422063), (5.502531118, 16.757645654))
            Line((5.502531118, 16.757645654), (3.32356512, 14.578679656))
            ThreePointArc((3.32356512, 14.578679656), (2.350295073, 13.928361402), (1.202244776, 13.7))
            Line((1.202244776, 13.7), (-1.202244776, 13.7))
            ThreePointArc((-1.202244776, 13.7), (-2.350295073, 13.928361402), (-3.32356512, 14.578679656))
            Line((-3.32356512, 14.578679656), (-5.502531118, 16.757645654))
            ThreePointArc((-5.502531118, 16.757645654), (-5.685684933, 17.678422063), (-4.905088386, 18.2))
            Line((-4.905088386, 18.2), (-2.8, 18.2))
            ThreePointArc((-2.8, 18.2), (-2.587867966, 18.287867966), (-2.5, 18.5))
        make_face()
        with Locations(Location((0, 10, 0), (0, 0, 180))):
            Circle(SKETCH4_R, mode=Mode.SUBTRACT)
        with Locations(Location((0, -10, 0), (0, 0, 90))):
            Circle(SKETCH4_R, mode=Mode.SUBTRACT)
        with BuildLine():
            Line((7.330671901, -1.414213562), (3.32356512, -5.421320344))
            ThreePointArc((3.32356512, -5.421320344), (2.350295073, -6.071638598), (1.202244776, -6.3))
            Line((1.202244776, -6.3), (-1.202244776, -6.3))
            ThreePointArc((-1.202244776, -6.3), (-2.350295073, -6.071638598), (-3.32356512, -5.421320344))
            Line((-3.32356512, -5.421320344), (-7.330671901, -1.414213562))
            ThreePointArc((-7.330671901, -1.414213562), (-7.916458339, 0), (-7.330671901, 1.414213562))
            Line((-7.330671901, 1.414213562), (-3.32356512, 5.421320344))
            ThreePointArc((-3.32356512, 5.421320344), (-2.350295073, 6.071638598), (-1.202244776, 6.3))
            Line((-1.202244776, 6.3), (1.202244776, 6.3))
            ThreePointArc((1.202244776, 6.3), (2.350295073, 6.071638598), (3.32356512, 5.421320344))
            Line((3.32356512, 5.421320344), (7.330671901, 1.414213562))
            ThreePointArc((7.330671901, 1.414213562), (7.916458339, 0), (7.330671901, -1.414213562))
        make_face(mode=Mode.SUBTRACT)
    boss_extrude2 = extrude(amount=-BOSS_EXTRUDE2_DEPTH)

    # Mirror1: Boss-Extrude2 across plane
    add(boss_extrude2.mirror(Plane.XY))


solid = part.part
